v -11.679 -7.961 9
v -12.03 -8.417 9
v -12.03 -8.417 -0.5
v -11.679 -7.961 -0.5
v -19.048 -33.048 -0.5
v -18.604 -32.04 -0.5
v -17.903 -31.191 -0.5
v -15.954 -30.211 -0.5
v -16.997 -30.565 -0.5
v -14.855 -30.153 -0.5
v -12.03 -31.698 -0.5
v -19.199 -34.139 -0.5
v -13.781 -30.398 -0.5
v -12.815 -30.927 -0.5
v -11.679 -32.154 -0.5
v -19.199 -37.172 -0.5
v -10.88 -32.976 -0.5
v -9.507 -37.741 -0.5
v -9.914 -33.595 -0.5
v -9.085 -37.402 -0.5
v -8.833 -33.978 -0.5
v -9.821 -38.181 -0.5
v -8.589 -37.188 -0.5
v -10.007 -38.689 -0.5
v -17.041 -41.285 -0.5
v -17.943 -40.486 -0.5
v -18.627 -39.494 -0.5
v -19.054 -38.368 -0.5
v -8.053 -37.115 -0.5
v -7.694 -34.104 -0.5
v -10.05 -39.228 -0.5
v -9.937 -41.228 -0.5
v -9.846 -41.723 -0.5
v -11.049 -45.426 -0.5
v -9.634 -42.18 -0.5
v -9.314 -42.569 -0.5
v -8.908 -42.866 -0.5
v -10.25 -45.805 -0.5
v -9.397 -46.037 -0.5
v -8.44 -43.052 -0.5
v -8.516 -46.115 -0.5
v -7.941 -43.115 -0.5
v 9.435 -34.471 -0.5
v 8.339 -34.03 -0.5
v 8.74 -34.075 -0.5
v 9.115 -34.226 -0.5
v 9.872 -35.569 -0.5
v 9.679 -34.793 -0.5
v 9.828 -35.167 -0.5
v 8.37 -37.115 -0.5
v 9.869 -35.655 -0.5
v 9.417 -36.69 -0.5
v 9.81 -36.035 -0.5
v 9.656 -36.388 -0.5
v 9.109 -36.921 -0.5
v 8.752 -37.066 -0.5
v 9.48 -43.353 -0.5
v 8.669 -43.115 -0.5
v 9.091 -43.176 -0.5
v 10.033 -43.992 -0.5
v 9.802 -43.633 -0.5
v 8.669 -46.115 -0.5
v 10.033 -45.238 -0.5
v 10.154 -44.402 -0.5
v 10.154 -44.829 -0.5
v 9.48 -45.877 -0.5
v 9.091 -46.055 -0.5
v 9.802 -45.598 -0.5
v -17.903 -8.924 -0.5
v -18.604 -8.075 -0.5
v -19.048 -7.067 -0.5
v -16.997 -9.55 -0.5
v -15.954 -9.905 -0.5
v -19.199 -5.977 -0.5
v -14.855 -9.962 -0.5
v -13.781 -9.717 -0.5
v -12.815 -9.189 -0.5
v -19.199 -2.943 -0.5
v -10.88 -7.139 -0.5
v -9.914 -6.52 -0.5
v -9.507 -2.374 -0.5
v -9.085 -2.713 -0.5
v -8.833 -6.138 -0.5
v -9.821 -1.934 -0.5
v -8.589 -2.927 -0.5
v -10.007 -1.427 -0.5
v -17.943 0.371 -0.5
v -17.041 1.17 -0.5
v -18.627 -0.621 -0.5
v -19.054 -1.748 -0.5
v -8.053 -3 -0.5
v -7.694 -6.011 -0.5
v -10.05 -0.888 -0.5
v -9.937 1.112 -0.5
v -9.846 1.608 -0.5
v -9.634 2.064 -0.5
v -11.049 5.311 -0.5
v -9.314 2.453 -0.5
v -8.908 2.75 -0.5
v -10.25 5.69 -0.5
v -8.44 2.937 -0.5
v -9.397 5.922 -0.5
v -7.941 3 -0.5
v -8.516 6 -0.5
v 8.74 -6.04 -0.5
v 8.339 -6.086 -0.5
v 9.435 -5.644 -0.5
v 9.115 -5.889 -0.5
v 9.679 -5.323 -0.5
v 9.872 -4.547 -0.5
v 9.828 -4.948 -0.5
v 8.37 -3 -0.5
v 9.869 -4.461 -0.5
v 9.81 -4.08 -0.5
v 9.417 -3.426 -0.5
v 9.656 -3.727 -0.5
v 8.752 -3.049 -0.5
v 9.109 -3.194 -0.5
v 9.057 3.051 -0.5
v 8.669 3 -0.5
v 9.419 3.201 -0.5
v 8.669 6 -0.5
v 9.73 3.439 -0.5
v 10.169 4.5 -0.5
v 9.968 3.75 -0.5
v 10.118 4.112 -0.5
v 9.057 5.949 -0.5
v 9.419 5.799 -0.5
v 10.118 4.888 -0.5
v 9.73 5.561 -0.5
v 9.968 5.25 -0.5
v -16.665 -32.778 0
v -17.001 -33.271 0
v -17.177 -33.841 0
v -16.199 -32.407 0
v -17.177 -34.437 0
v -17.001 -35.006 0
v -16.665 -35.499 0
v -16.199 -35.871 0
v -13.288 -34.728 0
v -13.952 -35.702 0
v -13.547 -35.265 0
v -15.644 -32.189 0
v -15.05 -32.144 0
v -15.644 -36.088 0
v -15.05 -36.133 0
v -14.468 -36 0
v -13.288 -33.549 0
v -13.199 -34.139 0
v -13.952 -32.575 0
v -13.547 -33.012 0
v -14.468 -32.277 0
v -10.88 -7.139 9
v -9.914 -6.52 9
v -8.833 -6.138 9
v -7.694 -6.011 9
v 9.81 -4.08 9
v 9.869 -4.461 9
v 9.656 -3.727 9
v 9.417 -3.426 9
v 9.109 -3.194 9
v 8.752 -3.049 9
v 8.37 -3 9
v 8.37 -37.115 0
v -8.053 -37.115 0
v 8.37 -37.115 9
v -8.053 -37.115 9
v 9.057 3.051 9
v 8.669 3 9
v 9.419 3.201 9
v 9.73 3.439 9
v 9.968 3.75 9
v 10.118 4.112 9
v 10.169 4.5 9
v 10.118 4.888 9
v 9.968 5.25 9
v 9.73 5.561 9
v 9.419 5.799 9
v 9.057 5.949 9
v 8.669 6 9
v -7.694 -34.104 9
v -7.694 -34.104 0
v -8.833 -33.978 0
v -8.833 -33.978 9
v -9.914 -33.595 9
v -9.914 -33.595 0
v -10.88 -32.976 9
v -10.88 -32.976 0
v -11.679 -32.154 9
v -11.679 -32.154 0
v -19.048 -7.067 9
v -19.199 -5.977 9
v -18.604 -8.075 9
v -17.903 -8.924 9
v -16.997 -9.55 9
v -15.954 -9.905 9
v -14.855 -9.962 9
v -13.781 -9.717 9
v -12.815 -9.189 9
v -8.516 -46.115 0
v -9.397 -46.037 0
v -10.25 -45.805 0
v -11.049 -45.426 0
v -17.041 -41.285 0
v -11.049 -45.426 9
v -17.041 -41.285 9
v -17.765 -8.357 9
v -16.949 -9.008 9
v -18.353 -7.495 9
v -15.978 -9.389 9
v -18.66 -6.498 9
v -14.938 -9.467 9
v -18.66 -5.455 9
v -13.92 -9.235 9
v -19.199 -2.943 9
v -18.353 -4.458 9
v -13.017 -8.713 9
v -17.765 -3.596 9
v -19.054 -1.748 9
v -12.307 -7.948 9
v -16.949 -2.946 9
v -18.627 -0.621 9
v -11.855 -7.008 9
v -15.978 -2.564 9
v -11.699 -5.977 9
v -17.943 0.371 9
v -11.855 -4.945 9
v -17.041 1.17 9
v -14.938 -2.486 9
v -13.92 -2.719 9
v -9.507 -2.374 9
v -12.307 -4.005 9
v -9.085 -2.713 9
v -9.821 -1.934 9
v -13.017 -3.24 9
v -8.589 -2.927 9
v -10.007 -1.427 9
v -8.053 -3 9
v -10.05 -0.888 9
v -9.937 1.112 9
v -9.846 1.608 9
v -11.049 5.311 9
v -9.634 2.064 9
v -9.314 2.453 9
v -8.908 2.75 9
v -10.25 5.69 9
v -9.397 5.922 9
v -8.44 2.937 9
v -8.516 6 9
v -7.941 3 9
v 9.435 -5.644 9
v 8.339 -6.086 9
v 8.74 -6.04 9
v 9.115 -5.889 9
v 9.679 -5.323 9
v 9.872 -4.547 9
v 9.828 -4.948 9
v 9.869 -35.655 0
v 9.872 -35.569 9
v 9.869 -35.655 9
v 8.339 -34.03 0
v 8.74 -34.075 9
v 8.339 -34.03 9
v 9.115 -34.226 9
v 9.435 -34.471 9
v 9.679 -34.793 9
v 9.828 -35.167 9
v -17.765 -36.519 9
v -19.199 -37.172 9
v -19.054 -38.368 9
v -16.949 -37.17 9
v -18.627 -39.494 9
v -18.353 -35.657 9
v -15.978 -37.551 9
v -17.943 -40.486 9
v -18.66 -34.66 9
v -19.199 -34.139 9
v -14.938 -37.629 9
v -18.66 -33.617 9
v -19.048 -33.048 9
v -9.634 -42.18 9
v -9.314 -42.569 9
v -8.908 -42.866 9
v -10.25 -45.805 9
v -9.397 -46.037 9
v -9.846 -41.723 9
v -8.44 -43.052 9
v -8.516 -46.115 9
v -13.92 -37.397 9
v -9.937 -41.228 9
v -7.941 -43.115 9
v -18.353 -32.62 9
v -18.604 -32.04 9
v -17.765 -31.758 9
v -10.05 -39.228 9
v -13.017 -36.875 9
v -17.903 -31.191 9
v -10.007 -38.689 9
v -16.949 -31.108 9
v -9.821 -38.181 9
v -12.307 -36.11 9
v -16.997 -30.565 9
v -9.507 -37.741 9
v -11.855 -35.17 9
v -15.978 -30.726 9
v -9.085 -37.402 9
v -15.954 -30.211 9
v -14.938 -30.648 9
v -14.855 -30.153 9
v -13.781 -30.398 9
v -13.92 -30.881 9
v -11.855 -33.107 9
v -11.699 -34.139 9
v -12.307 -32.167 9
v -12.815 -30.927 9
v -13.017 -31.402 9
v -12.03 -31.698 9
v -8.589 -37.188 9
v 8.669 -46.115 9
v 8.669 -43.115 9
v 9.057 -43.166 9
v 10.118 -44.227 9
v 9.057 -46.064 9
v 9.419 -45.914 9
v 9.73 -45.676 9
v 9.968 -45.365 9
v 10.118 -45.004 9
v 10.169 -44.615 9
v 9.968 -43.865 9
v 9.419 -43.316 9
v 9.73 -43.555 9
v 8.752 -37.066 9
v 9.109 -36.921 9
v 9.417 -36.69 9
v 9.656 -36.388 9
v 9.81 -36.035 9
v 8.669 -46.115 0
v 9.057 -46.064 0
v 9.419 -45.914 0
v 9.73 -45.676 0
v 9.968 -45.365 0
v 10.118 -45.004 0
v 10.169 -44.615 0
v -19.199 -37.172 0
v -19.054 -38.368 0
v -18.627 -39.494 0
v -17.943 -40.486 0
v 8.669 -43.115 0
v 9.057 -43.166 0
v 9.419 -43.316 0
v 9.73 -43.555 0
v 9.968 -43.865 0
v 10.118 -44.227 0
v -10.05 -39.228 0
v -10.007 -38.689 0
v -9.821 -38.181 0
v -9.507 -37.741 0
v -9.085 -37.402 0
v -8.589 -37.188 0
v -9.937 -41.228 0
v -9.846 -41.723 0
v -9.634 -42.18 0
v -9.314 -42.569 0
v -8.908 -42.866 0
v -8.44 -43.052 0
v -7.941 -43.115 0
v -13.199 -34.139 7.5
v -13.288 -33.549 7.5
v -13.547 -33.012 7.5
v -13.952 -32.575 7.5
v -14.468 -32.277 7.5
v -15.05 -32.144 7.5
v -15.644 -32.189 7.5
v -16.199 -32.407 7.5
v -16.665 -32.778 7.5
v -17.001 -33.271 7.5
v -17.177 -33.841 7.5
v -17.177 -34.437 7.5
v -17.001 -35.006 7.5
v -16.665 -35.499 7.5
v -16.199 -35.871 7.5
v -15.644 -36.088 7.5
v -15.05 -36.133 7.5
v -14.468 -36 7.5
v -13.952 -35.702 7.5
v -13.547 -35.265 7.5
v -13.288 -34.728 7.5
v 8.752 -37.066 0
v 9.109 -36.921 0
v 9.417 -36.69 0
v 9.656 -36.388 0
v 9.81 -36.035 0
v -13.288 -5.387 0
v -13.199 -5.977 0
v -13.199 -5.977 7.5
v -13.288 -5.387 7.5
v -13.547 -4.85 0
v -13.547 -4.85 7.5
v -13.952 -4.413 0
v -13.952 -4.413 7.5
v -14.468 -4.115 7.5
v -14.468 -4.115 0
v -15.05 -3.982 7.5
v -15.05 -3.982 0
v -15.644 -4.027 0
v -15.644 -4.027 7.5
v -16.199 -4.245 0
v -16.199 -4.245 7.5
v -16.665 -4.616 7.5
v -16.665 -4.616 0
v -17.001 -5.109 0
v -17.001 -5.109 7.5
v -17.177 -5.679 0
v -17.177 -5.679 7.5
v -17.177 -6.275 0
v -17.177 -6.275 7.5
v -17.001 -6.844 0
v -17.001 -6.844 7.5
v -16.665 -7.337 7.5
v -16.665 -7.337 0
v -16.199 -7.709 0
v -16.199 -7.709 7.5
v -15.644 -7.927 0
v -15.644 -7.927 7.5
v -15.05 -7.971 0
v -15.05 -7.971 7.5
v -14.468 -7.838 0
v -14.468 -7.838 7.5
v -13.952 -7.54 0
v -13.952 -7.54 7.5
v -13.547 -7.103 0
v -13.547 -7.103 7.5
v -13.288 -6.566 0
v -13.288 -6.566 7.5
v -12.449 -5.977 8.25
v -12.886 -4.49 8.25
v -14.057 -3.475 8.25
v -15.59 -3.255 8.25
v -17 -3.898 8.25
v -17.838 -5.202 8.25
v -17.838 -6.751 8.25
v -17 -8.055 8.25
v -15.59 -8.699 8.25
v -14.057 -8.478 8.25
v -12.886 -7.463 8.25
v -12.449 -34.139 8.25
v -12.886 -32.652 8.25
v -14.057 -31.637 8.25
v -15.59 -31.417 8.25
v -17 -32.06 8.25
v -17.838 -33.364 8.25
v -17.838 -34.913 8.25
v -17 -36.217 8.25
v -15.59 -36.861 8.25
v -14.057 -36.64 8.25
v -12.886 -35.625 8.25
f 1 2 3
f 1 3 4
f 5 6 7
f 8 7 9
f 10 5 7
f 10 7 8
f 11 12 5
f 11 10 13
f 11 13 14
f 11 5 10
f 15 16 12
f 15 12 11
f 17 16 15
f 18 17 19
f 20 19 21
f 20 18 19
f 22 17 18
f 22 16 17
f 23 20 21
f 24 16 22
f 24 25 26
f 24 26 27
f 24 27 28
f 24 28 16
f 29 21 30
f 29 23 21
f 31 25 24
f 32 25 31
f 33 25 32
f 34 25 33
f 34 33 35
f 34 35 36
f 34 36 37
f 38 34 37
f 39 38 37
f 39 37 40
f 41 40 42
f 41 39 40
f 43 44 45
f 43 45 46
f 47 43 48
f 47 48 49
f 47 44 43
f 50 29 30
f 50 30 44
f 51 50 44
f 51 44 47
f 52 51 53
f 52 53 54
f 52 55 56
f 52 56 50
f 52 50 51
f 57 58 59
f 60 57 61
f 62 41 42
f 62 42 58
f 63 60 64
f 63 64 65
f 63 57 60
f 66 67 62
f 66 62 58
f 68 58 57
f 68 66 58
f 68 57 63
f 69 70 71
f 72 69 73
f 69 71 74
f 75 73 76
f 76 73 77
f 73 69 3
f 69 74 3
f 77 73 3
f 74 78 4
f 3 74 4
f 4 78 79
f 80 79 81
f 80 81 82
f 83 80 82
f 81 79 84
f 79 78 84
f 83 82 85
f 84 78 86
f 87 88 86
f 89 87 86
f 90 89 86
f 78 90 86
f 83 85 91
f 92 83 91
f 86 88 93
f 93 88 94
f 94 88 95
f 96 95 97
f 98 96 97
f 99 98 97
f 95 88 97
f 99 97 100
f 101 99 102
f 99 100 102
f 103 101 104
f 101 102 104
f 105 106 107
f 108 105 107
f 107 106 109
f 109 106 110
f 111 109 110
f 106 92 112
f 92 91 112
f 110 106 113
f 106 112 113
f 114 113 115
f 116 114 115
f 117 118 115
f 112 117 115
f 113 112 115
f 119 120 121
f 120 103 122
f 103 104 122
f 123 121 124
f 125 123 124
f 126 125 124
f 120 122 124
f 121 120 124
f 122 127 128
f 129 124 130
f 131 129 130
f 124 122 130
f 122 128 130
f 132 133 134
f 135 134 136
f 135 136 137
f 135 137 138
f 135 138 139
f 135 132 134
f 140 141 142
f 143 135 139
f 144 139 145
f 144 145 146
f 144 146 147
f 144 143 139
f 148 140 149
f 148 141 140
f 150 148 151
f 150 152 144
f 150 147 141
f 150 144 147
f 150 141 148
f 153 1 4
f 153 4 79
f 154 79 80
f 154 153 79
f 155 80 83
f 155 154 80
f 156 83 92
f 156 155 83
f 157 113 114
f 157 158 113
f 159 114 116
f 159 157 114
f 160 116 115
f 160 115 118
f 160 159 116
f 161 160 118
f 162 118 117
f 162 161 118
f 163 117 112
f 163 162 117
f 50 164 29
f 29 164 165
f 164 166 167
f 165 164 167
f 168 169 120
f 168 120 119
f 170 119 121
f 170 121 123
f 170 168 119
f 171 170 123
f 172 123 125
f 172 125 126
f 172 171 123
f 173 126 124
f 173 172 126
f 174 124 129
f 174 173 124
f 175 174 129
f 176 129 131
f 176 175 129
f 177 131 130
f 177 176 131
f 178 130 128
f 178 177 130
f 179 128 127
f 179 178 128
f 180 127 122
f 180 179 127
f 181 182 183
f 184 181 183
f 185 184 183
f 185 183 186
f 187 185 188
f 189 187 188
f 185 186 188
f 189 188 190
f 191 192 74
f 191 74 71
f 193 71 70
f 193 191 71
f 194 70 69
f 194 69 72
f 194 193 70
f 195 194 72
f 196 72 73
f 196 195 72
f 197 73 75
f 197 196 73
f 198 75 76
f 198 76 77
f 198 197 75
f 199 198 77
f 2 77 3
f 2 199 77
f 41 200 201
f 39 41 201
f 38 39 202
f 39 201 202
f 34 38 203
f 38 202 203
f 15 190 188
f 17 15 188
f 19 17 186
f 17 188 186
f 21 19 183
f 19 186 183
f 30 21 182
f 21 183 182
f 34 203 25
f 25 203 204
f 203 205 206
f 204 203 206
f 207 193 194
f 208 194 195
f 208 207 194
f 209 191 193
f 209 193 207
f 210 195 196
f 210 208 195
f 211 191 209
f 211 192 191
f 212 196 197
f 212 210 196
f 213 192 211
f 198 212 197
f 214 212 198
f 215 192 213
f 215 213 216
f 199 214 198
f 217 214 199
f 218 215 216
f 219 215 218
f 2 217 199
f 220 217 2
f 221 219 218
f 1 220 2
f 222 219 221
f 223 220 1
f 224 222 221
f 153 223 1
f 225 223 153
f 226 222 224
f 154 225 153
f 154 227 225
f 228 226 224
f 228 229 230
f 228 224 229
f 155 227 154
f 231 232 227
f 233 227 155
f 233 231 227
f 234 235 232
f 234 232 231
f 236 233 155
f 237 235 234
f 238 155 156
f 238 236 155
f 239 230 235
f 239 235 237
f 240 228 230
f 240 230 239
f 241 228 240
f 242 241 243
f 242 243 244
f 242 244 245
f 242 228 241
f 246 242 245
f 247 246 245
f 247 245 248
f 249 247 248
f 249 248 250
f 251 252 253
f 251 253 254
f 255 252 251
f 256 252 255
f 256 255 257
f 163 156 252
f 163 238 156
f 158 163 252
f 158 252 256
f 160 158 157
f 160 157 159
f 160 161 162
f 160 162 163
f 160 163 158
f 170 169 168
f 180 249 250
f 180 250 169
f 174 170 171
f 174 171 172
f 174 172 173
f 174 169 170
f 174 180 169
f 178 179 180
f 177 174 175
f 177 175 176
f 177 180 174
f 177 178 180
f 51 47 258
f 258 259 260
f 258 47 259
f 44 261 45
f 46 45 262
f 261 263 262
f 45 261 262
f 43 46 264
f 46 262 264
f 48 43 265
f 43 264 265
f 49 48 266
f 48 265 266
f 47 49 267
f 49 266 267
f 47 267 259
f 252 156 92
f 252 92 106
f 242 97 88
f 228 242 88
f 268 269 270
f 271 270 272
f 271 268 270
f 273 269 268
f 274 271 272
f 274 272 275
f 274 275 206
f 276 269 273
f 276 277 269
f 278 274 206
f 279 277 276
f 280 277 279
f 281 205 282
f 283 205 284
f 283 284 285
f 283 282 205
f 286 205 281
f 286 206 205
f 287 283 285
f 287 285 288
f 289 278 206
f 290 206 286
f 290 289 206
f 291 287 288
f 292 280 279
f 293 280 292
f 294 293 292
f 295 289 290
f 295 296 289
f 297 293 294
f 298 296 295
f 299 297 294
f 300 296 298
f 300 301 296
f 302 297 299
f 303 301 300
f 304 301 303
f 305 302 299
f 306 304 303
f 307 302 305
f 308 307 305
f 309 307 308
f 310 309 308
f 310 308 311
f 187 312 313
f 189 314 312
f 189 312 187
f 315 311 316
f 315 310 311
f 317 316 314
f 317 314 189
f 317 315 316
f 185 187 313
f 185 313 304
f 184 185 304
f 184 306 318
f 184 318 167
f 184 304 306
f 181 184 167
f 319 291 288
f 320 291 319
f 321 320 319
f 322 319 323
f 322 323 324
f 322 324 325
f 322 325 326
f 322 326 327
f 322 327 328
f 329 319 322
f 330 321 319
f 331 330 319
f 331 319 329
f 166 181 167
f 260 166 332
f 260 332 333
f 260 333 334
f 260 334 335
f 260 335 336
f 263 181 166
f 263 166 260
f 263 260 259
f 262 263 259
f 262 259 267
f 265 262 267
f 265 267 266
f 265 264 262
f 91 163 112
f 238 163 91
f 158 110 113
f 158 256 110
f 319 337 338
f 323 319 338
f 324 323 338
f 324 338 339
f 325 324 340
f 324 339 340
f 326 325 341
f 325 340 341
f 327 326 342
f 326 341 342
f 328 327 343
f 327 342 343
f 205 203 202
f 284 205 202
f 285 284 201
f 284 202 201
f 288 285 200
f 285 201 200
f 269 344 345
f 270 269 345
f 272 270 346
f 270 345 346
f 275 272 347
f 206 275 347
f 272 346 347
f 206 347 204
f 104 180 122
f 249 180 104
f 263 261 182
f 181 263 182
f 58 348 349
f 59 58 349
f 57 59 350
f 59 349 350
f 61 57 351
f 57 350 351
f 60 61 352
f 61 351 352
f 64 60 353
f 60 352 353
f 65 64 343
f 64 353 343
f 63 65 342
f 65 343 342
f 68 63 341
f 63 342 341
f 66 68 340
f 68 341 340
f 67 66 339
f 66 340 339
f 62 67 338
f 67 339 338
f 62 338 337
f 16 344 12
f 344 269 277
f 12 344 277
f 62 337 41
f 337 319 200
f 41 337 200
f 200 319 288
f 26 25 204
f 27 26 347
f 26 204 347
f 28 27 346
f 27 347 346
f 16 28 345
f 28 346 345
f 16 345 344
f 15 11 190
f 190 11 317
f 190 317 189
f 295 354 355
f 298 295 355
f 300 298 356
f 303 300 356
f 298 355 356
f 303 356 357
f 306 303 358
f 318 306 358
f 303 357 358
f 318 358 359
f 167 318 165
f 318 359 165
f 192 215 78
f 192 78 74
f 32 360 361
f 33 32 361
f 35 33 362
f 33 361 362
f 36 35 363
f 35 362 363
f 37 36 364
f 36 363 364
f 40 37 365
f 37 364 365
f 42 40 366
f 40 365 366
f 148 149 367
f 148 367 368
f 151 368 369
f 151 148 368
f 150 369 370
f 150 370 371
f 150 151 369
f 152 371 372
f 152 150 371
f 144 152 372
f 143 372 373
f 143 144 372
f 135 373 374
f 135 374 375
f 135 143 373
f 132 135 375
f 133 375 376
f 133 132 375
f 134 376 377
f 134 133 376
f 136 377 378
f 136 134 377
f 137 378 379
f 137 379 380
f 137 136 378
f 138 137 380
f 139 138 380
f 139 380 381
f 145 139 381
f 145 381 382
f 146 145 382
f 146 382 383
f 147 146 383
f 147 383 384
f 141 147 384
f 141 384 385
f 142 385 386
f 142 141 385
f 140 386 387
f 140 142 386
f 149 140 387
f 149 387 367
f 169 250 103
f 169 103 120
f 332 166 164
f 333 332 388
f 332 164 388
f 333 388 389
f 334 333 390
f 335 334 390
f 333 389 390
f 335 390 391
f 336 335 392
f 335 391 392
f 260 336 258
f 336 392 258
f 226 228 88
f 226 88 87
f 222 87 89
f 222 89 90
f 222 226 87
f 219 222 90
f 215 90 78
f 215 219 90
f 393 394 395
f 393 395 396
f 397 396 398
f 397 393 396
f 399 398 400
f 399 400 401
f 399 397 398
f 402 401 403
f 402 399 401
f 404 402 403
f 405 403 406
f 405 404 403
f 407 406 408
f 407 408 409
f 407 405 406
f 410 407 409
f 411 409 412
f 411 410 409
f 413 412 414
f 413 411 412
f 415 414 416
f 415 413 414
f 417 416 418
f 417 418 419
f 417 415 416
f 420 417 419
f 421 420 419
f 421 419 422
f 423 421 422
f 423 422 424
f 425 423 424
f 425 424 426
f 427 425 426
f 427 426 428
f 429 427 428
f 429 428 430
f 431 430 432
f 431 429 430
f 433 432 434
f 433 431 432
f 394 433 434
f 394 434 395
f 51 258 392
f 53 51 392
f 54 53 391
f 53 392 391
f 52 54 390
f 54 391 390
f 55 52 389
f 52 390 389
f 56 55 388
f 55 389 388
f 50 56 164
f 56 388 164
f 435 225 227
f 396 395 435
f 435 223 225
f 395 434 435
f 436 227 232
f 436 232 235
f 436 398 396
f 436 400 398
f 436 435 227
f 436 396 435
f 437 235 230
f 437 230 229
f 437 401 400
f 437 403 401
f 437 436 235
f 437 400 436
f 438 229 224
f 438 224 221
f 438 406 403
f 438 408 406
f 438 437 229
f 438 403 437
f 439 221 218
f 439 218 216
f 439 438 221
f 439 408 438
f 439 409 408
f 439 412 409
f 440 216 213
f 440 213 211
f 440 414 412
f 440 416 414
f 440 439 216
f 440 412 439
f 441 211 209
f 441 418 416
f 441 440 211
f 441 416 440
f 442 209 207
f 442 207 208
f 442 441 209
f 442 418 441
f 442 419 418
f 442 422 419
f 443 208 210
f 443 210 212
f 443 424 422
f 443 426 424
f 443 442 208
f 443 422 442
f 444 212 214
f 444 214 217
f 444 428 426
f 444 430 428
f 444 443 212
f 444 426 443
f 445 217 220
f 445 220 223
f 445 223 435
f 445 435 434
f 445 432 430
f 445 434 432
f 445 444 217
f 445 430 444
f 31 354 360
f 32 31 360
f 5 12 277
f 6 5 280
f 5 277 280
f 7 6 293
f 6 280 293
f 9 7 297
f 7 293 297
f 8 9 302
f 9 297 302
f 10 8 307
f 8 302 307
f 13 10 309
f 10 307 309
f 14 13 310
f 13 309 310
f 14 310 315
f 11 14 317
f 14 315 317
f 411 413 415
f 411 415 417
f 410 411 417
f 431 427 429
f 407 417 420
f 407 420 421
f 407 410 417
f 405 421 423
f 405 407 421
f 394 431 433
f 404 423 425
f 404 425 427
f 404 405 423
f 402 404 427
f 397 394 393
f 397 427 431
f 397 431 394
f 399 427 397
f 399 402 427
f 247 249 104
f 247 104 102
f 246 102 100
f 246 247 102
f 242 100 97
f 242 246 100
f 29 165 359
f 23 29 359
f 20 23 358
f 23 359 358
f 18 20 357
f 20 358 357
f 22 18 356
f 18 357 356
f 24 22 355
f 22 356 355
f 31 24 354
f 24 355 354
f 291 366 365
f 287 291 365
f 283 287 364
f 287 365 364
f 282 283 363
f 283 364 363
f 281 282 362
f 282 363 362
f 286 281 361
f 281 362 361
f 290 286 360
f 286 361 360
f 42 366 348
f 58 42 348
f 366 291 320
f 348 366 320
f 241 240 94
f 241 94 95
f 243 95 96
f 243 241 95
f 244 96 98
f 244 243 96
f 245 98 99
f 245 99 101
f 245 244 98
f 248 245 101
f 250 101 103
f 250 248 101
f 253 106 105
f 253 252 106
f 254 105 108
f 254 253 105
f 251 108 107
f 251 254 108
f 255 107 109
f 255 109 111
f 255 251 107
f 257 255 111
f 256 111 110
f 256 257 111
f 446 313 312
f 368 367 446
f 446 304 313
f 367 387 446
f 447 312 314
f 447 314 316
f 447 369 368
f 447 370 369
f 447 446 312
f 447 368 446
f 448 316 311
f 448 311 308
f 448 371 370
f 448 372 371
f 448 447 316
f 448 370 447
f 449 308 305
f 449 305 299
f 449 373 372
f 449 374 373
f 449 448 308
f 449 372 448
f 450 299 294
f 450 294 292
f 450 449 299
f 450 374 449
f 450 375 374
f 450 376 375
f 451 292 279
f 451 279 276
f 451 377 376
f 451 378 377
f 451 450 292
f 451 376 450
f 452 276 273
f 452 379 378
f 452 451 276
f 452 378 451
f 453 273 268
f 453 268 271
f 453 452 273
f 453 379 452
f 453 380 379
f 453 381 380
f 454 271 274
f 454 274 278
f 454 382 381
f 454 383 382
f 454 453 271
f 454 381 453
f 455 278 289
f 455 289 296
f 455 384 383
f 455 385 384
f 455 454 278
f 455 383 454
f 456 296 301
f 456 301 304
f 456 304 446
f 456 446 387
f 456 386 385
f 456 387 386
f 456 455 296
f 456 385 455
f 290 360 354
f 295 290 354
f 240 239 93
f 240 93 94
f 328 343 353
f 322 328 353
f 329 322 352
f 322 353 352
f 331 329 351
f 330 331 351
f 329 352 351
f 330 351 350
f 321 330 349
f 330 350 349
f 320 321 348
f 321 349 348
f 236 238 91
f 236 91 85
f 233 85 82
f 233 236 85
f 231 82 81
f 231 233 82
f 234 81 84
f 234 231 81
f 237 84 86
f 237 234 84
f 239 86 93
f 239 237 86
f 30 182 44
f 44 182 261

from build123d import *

# Parameters (mm, degrees)
F0_R      = 2
F1_DEPTH  = 9
F2_DEPTH  = 0.5
F1_FACE_R = 2
F3_DEPTH  = 0.5
F4_SIZE   = 1.5
F4_2_SIZE = 1.5


# Not quite as in the source:
# - a feature names something its author has since deleted; it is built from what else it names


with BuildPart() as f1:
    # F0 (on Top) → F1 (new body)
    with BuildSketch(Plane.XY):
        with BuildLine():
            ThreePointArc((9.8694702636, -4.4606494482), (9.4166416974, -3.4255173739), (8.3699865077, -3))
            Line((8.3699865077, -3), (-8.0531213294, -3))
            ThreePointArc((-8.0531213294, -3), (-9.5065298079, -2.3739009406), (-10.0499606051, -0.8876037946))
            Line((-10.0499606051, -0.8876037946), (-9.9373864918, 1.1123962054))
            ThreePointArc((-9.9373864918, 1.1123962054), (-9.3144481567, 2.4534084785), (-7.9405472161, 3))
            Line((-7.9405472161, 3), (8.6688611699, 3))
            ThreePointArc((8.6688611699, 3), (9.7295213417, 3.4393398282), (10.1688611699, 4.5))
            ThreePointArc((10.1688611699, 4.5), (9.7295213417, 5.5606601718), (8.6688611699, 6))
            Line((8.6688611699, 6), (-8.5157040276, 6))
            ThreePointArc((-8.5157040276, 6), (-9.8283738232, 5.8246137677), (-11.0489539349, 5.3107592031))
            Line((-11.0489539349, 5.3107592031), (-17.0414804275, 1.1700296424))
            ThreePointArc((-17.0414804275, 1.1700296424), (-18.6269732101, -0.6209627525), (-19.1991173223, -2.9434812642))
            Line((-19.1991173223, -2.9434812642), (-19.1991173223, -5.9767054254))
            ThreePointArc((-19.1991173223, -5.9767054254), (-15.1991173223, -1.9767054254), (-11.1991173223, -5.9767054254))
            ThreePointArc((-11.1991173223, -5.9767054254), (-11.4124427302, -7.2655403775), (-12.0296650891, -8.4169047086))
            Line((-12.0296650891, -8.4169047086), (-11.6787809816, -7.9611589727))
            ThreePointArc((-11.6787809816, -7.9611589727), (-9.9143715805, -6.5201490824), (-7.6938114768, -6.0114616886))
            Line((-7.6938114768, -6.0114616886), (8.3394779622, -6.0857101255))
            ThreePointArc((8.3394779622, -6.0857101255), (9.4352310222, -5.6443974444), (9.8717289248, -4.5467175129))
            Line((9.8717289248, -4.5467175129), (9.8694702636, -4.4606494482))
        make_face()
        with BuildLine():
            ThreePointArc((-19.1991173223, -5.9767054254), (-16.4879522743, -9.7633800175), (-12.0296650891, -8.4169047086))
            ThreePointArc((-12.0296650891, -8.4169047086), (-11.4124427302, -7.2655403775), (-11.1991173223, -5.9767054254))
            ThreePointArc((-11.1991173223, -5.9767054254), (-15.1991173223, -1.9767054254), (-19.1991173223, -5.9767054254))
        make_face()
        with Locations((-15.1991173223, -5.9767054254)):
            Circle(F0_R, mode=Mode.SUBTRACT)
    extrude(amount=F1_DEPTH)

    # F0 (on Top) → F2 (join)
    with BuildSketch(Plane.XY):
        with BuildLine():
            ThreePointArc((9.8694702636, -4.4606494482), (9.4166416974, -3.4255173739), (8.3699865077, -3))
            Line((8.3699865077, -3), (-8.0531213294, -3))
            ThreePointArc((-8.0531213294, -3), (-9.5065298079, -2.3739009406), (-10.0499606051, -0.8876037946))
            Line((-10.0499606051, -0.8876037946), (-9.9373864918, 1.1123962054))
            ThreePointArc((-9.9373864918, 1.1123962054), (-9.3144481567, 2.4534084785), (-7.9405472161, 3))
            Line((-7.9405472161, 3), (8.6688611699, 3))
            ThreePointArc((8.6688611699, 3), (9.7295213417, 3.4393398282), (10.1688611699, 4.5))
            ThreePointArc((10.1688611699, 4.5), (9.7295213417, 5.5606601718), (8.6688611699, 6))
            Line((8.6688611699, 6), (-8.5157040276, 6))
            ThreePointArc((-8.5157040276, 6), (-9.8283738232, 5.8246137677), (-11.0489539349, 5.3107592031))
            Line((-11.0489539349, 5.3107592031), (-17.0414804275, 1.1700296424))
            ThreePointArc((-17.0414804275, 1.1700296424), (-18.6269732101, -0.6209627525), (-19.1991173223, -2.9434812642))
            Line((-19.1991173223, -2.9434812642), (-19.1991173223, -5.9767054254))
            ThreePointArc((-19.1991173223, -5.9767054254), (-15.1991173223, -1.9767054254), (-11.1991173223, -5.9767054254))
            ThreePointArc((-11.1991173223, -5.9767054254), (-11.4124427302, -7.2655403775), (-12.0296650891, -8.4169047086))
            Line((-12.0296650891, -8.4169047086), (-11.6787809816, -7.9611589727))
            ThreePointArc((-11.6787809816, -7.9611589727), (-9.9143715805, -6.5201490824), (-7.6938114768, -6.0114616886))
            Line((-7.6938114768, -6.0114616886), (8.3394779622, -6.0857101255))
            ThreePointArc((8.3394779622, -6.0857101255), (9.4352310222, -5.6443974444), (9.8717289248, -4.5467175129))
            Line((9.8717289248, -4.5467175129), (9.8694702636, -4.4606494482))
        make_face()
        with BuildLine():
            ThreePointArc((-19.1991173223, -5.9767054254), (-16.4879522743, -9.7633800175), (-12.0296650891, -8.4169047086))
            ThreePointArc((-12.0296650891, -8.4169047086), (-11.4124427302, -7.2655403775), (-11.1991173223, -5.9767054254))
            ThreePointArc((-11.1991173223, -5.9767054254), (-15.1991173223, -1.9767054254), (-19.1991173223, -5.9767054254))
        make_face()
        with Locations((-15.1991173223, -5.9767054254)):
            Circle(F0_R, mode=Mode.SUBTRACT)
        with Locations((-15.1991173223, -5.9767054254)):
            Circle(F0_R)
    extrude(amount=-F2_DEPTH)

    # F4
    f4_edges = [f1.edges().sort_by_distance(p)[0] for p in [
        (-17.199117, -5.976705, 9),
    ]]
    chamfer(f4_edges, length=F4_SIZE)


with BuildPart() as f1b:
    # F0 (on Top) → F1, piece 2 (new body)
    with BuildSketch(Plane.XY):
        with BuildLine():
            ThreePointArc((-19.1991173223, -34.1385988658), (-15.1991173223, -38.1385988658), (-11.1991173223, -34.1385988658))
            ThreePointArc((-11.1991173223, -34.1385988658), (-11.4124427302, -32.8497639138), (-12.0296650891, -31.6983995827))
            ThreePointArc((-12.0296650891, -31.6983995827), (-16.4879522743, -30.3519242737), (-19.1991173223, -34.1385988658))
        make_face()
        with Locations((-15.1991173223, -34.1385988658)):
            Circle(F0_R, mode=Mode.SUBTRACT)
        with BuildLine():
            ThreePointArc((-12.0296650891, -31.6983995827), (-11.4124427302, -32.8497639138), (-11.1991173223, -34.1385988658))
            ThreePointArc((-11.1991173223, -34.1385988658), (-15.1991173223, -38.1385988658), (-19.1991173223, -34.1385988658))
            Line((-19.1991173223, -34.1385988658), (-19.1991173223, -37.1718230271))
            ThreePointArc((-19.1991173223, -37.1718230271), (-18.6269732101, -39.4943415388), (-17.0414804275, -41.2853339337))
            Line((-17.0414804275, -41.2853339337), (-11.0489539349, -45.4260634944))
            ThreePointArc((-11.0489539349, -45.4260634944), (-9.8283738232, -45.939918059), (-8.5157040276, -46.1153042912))
            Line((-8.5157040276, -46.1153042912), (8.6688611699, -46.1153042912))
            ThreePointArc((8.6688611699, -46.1153042912), (9.7295213417, -45.675964463), (10.1688611699, -44.6153042912))
            ThreePointArc((10.1688611699, -44.6153042912), (9.7295213417, -43.5546441195), (8.6688611699, -43.1153042912))
            Line((8.6688611699, -43.1153042912), (-7.9405472161, -43.1153042912))
            ThreePointArc((-7.9405472161, -43.1153042912), (-9.3144481567, -42.5687127698), (-9.9373864918, -41.2277004967))
            Line((-9.9373864918, -41.2277004967), (-10.0499606051, -39.2277004967))
            ThreePointArc((-10.0499606051, -39.2277004967), (-9.5065298079, -37.7414033506), (-8.0531213294, -37.1153042912))
            Line((-8.0531213294, -37.1153042912), (8.3699865077, -37.1153042912))
            ThreePointArc((8.3699865077, -37.1153042912), (9.4166416974, -36.6897869174), (9.8694702636, -35.6546548431))
            Line((9.8694702636, -35.6546548431), (9.8717289248, -35.5685867783))
            ThreePointArc((9.8717289248, -35.5685867783), (9.4352310222, -34.4709068468), (8.3394779622, -34.0295941658))
            Line((8.3394779622, -34.0295941658), (-7.6938114768, -34.1038426026))
            ThreePointArc((-7.6938114768, -34.1038426026), (-9.9143715805, -33.5951552089), (-11.6787809816, -32.1541453186))
            Line((-11.6787809816, -32.1541453186), (-12.0296650891, -31.6983995827))
        make_face()
    extrude(amount=F1_DEPTH)

    # F1_face (on face) + F0 (on Top) → F3 (join)
    with BuildSketch(Plane(origin=(-6.3231284522, -38.9885454206, 0), x_dir=(1, 0, 0), z_dir=(0, 0, -1))):
        with BuildLine():
            ThreePointArc((-12.8759888701, -4.8499465548), (-10.1648238221, -8.6366211469), (-5.7065366369, -7.2901458379))
            Line((-5.7065366369, -7.2901458379), (-5.3556525294, -6.834400102))
            ThreePointArc((-5.3556525294, -6.834400102), (-3.5912431283, -5.3933902117), (-1.3706830246, -4.8847028179))
            Line((-1.3706830246, -4.8847028179), (14.6626064144, -4.9589512548))
            ThreePointArc((14.6626064144, -4.9589512548), (15.7583594744, -4.5176385738), (16.194857377, -3.4199586423))
            Line((16.194857377, -3.4199586423), (16.1925987158, -3.3338905775))
            ThreePointArc((16.1925987158, -3.3338905775), (15.7397701496, -2.2987585032), (14.6931149599, -1.8732411293))
            Line((14.6931149599, -1.8732411293), (-1.7299928771, -1.8732411293))
            ThreePointArc((-1.7299928771, -1.8732411293), (-3.1834013556, -1.2471420699), (-3.7268321528, 0.2391550761))
            Line((-3.7268321528, 0.2391550761), (-3.6142580396, 2.2391550761))
            ThreePointArc((-3.6142580396, 2.2391550761), (-2.9913197045, 3.5801673492), (-1.6174187638, 4.1267588707))
            Line((-1.6174187638, 4.1267588707), (14.9919896221, 4.1267588707))
            ThreePointArc((14.9919896221, 4.1267588707), (16.4919896221, 5.6267588707), (14.9919896221, 7.1267588707))
            Line((14.9919896221, 7.1267588707), (-2.1925755754, 7.1267588707))
            ThreePointArc((-2.1925755754, 7.1267588707), (-3.5052453709, 6.9513726384), (-4.7258254826, 6.4375180738))
            Line((-4.7258254826, 6.4375180738), (-10.7183519752, 2.2967885131))
            ThreePointArc((-10.7183519752, 2.2967885131), (-12.3038447579, 0.5057961182), (-12.8759888701, -1.8167223935))
            Line((-12.8759888701, -1.8167223935), (-12.8759888701, -4.8499465548))
        make_face()
        with Locations((-8.8759888701, -4.8499465548)):
            Circle(F1_FACE_R, mode=Mode.SUBTRACT)
    with BuildSketch(Plane.XY):
        with Locations((-15.1991173223, -34.1385988658)):
            Circle(F0_R)
    extrude(amount=F3_DEPTH, dir=(0, 0, -1))

    # F4#2
    f4_2_edges = [f1b.edges().sort_by_distance(p)[0] for p in [
        (-17.199117, -34.138599, 9),
    ]]
    chamfer(f4_2_edges, length=F4_2_SIZE)


solid = Compound([f1.part, f1b.part])
